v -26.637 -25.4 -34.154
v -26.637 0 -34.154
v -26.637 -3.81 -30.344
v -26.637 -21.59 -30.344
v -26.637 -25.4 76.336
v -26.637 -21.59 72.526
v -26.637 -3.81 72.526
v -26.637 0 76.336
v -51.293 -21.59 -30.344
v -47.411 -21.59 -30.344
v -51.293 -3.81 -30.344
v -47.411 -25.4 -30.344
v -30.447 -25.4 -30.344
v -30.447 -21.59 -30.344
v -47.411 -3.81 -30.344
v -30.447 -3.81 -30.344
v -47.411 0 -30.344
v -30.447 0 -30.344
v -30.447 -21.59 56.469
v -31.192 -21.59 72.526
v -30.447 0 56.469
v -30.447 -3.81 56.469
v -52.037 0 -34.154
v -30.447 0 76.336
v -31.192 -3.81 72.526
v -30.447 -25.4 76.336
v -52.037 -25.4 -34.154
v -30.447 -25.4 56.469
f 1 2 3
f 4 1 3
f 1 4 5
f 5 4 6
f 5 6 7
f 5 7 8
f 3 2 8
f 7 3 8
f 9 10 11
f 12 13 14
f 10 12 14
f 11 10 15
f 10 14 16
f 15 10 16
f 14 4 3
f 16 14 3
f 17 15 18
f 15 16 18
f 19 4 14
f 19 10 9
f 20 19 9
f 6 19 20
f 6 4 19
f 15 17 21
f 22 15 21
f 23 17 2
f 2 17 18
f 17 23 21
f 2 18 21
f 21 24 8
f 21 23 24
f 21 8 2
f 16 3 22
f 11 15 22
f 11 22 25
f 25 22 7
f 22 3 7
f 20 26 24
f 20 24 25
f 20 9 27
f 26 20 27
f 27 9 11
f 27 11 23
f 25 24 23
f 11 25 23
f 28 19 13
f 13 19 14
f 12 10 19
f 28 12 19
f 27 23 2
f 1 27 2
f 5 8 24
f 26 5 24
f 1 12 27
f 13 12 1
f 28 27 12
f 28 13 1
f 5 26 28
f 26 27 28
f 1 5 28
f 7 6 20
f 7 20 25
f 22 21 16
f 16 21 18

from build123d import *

# Parameters (mm, degrees)
F1_DEPTH = 25.4
F2_W     = 17.78
F2_H     = 102.87
F3_DEPTH = 50.8


with BuildPart() as f1:
    # F0 (on Front) → F1 (new body)
    with BuildSketch(Plane.XZ):
        Polygon((-26.637435, 76.336338), (-30.447435, 76.336338), (-52.037435, -34.153662), (-26.637435, -34.153662), align=None)
        Polygon((-47.410897, -30.343662), (-30.447435, 56.469348), (-30.447435, -30.343662), align=None, mode=Mode.SUBTRACT)
    extrude(amount=F1_DEPTH)

    # F2 (on face) → F3 (cut)
    with BuildSketch(Plane.YZ.offset(-26.637435)):
        with Locations((-12.7, 21.091338)):
            Rectangle(F2_W, F2_H)
    extrude(amount=-F3_DEPTH, mode=Mode.SUBTRACT)


solid = f1.part
